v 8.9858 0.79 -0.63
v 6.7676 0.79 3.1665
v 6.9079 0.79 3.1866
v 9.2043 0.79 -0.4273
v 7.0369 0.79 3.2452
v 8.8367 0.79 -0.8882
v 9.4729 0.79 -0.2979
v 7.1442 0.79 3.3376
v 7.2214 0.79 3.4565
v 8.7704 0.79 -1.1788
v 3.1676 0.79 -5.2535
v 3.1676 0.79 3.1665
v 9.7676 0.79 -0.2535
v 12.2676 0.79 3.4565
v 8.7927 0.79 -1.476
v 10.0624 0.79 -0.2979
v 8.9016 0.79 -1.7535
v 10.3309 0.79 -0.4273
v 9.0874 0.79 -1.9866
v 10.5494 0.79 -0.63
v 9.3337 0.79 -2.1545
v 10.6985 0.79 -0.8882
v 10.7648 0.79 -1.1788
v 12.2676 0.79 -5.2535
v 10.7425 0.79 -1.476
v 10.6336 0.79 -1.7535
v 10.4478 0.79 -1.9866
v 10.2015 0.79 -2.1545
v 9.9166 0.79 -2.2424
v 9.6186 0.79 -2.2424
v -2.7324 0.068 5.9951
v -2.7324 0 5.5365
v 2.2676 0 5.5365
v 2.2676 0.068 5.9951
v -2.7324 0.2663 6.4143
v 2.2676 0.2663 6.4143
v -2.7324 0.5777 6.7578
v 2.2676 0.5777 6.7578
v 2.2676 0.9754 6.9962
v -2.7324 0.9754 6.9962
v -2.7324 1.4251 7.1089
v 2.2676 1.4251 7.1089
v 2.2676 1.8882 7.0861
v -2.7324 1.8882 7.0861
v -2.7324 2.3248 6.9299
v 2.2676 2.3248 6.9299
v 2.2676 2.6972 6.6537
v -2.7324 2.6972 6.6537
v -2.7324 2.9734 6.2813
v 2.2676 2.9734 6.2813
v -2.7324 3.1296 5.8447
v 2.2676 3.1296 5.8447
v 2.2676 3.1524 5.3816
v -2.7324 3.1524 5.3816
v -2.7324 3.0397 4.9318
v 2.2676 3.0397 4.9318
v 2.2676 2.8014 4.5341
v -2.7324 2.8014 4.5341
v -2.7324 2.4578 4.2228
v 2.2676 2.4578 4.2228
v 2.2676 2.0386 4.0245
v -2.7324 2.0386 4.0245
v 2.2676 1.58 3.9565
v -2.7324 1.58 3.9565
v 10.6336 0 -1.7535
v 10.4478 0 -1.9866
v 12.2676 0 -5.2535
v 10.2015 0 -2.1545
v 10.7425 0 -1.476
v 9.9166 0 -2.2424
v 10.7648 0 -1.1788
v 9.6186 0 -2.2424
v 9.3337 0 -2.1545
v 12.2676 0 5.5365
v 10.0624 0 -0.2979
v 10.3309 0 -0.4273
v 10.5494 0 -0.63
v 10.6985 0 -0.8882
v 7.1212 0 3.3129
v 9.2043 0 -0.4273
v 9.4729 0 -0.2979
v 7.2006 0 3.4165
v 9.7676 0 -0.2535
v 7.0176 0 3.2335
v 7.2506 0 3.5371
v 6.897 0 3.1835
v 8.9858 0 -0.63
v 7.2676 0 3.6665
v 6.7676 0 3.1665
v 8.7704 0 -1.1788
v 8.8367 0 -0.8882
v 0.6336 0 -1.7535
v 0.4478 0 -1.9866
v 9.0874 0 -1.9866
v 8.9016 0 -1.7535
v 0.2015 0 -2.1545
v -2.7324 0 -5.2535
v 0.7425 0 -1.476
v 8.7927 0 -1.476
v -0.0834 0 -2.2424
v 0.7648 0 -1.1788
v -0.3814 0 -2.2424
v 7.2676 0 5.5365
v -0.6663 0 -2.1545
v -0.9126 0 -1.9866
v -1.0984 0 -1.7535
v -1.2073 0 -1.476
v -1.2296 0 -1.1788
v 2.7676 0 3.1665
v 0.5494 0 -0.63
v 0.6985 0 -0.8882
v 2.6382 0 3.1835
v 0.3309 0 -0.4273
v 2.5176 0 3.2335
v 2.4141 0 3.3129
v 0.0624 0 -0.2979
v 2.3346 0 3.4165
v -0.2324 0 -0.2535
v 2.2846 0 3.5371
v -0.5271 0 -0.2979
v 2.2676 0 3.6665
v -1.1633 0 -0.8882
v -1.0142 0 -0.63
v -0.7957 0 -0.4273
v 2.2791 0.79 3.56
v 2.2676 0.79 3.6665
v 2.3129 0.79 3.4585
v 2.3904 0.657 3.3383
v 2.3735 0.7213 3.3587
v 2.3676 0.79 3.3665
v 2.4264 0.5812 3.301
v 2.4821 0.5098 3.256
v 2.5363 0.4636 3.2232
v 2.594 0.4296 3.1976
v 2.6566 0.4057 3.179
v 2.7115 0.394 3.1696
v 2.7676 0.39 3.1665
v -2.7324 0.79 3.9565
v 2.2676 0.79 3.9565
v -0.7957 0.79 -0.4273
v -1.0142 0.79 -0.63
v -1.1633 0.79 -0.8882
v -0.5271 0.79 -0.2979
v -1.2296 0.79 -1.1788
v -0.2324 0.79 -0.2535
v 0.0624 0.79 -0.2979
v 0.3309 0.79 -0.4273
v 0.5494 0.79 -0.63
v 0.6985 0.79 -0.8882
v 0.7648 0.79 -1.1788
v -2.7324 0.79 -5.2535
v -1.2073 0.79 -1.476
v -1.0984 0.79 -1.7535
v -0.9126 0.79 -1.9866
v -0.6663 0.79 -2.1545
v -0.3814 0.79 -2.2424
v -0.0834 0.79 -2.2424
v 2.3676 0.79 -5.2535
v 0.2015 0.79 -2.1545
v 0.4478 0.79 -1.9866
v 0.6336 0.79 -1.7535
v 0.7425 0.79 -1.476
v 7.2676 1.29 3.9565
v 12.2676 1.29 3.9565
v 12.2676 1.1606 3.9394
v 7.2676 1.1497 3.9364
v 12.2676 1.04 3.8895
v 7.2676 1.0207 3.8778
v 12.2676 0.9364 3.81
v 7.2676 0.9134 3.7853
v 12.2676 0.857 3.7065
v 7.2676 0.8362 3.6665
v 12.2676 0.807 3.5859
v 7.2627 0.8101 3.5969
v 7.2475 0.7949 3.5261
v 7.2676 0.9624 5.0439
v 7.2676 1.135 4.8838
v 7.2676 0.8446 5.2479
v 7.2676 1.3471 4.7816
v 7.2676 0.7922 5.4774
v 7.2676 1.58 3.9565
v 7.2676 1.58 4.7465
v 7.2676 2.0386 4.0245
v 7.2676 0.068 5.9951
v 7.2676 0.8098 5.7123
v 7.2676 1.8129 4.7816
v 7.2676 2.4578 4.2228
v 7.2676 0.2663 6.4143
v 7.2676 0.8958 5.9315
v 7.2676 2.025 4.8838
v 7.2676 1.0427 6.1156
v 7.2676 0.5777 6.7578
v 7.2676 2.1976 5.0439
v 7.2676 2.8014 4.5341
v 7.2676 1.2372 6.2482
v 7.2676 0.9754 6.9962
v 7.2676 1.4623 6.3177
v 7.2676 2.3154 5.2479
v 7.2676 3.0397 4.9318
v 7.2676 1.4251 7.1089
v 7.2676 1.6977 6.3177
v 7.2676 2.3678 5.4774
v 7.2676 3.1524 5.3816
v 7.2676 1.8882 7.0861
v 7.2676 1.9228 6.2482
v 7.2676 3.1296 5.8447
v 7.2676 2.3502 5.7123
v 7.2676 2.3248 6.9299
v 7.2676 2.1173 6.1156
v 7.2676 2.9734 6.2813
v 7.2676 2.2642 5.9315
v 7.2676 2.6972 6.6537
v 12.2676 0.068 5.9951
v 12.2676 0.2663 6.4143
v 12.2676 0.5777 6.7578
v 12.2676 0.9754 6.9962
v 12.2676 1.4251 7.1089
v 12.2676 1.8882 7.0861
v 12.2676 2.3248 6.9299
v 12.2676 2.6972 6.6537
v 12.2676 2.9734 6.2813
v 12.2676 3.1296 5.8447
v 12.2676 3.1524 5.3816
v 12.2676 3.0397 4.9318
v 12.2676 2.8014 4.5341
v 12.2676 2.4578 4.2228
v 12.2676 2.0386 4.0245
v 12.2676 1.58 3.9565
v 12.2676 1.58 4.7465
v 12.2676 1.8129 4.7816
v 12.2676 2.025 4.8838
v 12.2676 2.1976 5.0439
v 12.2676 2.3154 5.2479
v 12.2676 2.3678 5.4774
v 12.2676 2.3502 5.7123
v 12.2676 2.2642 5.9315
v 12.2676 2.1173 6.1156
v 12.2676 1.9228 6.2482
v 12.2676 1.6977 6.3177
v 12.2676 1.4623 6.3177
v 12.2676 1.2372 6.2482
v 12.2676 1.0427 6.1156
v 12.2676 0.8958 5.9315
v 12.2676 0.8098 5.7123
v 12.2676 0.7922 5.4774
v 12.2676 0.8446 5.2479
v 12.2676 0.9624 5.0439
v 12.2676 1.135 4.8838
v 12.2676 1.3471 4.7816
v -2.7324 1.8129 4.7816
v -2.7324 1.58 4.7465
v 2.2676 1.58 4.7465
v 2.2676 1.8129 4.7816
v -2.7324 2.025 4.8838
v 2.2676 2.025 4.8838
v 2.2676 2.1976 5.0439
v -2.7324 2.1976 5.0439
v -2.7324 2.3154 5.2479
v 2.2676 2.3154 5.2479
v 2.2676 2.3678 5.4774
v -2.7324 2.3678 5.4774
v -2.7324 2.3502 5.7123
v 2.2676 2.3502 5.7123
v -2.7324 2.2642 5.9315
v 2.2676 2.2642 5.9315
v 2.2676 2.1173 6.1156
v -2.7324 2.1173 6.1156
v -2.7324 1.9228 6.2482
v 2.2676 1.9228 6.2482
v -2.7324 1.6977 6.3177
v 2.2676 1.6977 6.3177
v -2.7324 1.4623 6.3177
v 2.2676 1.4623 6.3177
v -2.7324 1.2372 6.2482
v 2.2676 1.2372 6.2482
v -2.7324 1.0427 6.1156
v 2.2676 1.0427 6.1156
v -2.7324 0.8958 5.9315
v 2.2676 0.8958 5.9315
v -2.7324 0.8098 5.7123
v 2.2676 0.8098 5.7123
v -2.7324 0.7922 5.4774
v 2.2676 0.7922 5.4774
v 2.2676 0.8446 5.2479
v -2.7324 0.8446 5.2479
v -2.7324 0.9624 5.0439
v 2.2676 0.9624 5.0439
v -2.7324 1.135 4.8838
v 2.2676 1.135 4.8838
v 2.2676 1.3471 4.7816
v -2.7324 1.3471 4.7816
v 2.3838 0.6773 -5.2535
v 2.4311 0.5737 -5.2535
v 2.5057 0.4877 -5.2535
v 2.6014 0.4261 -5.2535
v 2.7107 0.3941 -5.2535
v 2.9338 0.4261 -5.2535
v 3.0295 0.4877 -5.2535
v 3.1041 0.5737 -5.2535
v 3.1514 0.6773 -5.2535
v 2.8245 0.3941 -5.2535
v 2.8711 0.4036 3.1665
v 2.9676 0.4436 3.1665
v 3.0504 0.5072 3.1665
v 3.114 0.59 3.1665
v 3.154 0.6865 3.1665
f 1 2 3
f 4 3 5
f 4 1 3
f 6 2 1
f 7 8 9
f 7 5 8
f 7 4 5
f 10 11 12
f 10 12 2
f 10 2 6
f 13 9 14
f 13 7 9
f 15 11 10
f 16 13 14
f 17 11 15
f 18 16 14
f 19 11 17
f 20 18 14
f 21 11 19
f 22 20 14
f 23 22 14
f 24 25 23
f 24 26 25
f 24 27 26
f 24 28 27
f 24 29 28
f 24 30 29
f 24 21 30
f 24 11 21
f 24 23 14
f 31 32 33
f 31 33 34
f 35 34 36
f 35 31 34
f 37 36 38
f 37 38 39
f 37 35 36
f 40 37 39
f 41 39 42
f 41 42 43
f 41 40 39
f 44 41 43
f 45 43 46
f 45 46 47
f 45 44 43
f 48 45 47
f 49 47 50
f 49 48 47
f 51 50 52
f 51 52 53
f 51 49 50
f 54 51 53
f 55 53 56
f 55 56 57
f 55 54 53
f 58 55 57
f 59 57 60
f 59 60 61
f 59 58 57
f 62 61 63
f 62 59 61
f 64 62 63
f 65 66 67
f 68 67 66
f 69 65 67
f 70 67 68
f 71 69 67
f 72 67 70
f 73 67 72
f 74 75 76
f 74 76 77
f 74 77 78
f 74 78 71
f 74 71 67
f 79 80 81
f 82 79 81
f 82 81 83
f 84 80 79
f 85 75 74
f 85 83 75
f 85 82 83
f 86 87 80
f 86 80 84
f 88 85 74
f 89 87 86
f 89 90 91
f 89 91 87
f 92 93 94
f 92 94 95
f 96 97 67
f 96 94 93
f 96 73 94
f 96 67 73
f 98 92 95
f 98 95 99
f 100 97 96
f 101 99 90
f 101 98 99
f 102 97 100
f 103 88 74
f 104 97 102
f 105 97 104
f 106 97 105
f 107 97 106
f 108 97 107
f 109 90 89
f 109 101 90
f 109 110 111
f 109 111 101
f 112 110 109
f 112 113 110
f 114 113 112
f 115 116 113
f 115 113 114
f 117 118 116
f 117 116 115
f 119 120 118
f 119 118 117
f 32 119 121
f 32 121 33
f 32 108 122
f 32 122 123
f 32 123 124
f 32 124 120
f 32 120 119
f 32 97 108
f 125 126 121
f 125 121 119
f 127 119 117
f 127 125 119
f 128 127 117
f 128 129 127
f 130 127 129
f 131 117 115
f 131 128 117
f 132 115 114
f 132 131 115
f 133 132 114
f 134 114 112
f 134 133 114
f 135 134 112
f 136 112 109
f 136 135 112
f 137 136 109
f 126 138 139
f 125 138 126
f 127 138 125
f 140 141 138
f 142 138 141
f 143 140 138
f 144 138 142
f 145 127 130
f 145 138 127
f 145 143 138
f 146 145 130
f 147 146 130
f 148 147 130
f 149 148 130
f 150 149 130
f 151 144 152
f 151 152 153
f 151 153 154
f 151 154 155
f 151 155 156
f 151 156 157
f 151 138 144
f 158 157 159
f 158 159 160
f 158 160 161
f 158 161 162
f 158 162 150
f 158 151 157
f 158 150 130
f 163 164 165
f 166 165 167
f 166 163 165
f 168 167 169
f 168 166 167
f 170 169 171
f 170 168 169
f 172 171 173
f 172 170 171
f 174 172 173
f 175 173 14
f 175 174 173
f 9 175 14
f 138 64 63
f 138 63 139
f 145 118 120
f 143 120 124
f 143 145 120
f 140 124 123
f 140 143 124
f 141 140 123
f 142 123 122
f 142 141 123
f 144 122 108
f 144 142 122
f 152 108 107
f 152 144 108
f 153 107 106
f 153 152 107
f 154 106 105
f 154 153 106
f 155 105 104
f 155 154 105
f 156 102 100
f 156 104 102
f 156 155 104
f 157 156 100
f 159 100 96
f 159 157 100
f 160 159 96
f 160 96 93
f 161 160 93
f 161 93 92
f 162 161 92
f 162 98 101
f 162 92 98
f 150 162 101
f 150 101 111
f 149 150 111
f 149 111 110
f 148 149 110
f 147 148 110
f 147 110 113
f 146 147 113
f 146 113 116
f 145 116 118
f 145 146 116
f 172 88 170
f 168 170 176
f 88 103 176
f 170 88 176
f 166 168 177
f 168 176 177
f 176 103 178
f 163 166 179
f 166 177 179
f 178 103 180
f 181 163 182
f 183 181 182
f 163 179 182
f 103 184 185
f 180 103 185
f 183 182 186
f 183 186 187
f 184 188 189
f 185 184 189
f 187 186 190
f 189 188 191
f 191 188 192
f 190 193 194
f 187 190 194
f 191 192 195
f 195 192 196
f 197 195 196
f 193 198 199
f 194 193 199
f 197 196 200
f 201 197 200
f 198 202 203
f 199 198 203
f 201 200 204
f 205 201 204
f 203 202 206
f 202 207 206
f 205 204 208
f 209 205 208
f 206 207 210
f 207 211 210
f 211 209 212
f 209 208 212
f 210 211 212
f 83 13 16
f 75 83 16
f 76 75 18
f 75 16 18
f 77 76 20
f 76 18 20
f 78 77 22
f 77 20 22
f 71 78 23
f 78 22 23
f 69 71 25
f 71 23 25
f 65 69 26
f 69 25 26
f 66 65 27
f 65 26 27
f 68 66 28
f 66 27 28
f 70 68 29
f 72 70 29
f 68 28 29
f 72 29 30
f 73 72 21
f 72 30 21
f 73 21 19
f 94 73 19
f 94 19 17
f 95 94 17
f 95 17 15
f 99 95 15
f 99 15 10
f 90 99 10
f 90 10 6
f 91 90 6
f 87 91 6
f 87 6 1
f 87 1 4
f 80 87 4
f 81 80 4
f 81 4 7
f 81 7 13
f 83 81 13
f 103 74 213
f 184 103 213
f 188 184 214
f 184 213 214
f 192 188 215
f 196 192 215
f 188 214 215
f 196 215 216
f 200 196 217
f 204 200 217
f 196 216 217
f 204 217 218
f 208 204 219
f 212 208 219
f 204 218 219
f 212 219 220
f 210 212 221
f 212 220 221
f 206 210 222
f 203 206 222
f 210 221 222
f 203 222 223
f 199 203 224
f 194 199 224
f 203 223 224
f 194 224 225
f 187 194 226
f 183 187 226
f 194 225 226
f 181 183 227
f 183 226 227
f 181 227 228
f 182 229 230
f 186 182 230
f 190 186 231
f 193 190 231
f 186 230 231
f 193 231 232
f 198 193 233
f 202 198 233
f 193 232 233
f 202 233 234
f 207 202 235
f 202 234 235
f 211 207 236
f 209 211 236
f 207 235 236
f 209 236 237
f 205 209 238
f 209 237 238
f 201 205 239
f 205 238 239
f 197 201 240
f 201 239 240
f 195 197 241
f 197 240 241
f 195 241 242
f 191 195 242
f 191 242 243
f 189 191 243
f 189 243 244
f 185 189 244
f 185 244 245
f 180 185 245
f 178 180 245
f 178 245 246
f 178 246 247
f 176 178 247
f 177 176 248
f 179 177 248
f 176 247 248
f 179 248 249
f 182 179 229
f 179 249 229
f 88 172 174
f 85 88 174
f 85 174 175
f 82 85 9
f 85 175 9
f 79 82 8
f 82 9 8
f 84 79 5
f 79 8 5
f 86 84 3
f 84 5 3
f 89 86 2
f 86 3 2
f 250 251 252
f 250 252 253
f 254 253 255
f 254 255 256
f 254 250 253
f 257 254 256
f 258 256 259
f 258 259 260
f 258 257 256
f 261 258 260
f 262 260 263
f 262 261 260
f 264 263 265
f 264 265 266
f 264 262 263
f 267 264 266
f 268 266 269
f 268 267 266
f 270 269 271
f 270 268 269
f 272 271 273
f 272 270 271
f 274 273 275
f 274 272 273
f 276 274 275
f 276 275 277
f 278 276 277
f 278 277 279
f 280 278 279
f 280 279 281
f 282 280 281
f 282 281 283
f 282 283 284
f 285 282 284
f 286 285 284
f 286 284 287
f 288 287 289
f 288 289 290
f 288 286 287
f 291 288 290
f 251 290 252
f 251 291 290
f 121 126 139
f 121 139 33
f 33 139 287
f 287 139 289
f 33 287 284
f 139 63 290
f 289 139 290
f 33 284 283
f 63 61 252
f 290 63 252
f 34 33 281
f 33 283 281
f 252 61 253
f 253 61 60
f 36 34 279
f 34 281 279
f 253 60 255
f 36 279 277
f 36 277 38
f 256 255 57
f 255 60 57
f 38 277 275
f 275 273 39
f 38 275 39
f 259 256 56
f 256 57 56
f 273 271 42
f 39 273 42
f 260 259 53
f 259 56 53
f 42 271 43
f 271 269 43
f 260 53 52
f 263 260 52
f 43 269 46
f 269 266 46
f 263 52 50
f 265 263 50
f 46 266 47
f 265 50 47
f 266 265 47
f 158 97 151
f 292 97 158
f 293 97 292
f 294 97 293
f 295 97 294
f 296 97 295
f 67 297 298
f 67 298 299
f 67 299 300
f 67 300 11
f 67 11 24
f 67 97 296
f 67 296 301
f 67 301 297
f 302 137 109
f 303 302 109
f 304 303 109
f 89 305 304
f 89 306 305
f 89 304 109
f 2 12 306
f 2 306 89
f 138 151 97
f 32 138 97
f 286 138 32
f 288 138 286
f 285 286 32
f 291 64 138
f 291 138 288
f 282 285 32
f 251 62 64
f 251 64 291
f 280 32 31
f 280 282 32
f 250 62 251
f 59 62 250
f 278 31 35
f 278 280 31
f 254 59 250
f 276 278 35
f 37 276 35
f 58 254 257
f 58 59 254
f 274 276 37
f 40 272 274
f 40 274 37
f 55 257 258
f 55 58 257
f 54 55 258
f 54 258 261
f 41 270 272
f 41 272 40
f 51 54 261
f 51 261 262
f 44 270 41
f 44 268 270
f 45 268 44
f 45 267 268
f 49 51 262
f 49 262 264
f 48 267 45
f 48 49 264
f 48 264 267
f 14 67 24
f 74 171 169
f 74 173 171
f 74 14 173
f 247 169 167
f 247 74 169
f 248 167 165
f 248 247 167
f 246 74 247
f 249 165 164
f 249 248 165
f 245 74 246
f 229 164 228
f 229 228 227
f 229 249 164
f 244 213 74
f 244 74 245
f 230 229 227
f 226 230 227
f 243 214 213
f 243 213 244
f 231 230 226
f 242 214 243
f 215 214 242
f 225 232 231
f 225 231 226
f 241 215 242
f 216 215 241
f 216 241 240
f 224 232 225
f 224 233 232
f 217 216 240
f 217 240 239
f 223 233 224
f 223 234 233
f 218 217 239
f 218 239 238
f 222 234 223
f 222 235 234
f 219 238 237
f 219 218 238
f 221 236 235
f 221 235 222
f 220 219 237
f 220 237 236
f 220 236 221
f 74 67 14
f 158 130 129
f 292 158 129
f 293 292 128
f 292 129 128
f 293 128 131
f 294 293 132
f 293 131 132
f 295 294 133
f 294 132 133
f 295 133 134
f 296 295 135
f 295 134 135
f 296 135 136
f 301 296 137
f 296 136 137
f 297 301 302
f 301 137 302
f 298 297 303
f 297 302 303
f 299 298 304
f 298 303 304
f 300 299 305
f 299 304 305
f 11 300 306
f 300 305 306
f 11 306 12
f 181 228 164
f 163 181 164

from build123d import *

# Parameters (mm, degrees)
SKETCH1_W              = 25
SKETCH1_H              = 10
BASE_PLATE_DEPTH       = 0.79
SKETCH5_R              = 0.79
PIN_HOLDER_DEPTH       = 5
FILLET1_R              = 0.5
SKETCH6_R              = 1
SCREW_HOLES_DEPTH      = 5
SKETCH7_W              = 5
SKETCH7_H              = 0.79
HINGE_GROOVES_DEPTH    = 1.58
FILLET2_R              = 0.5
SKETCH8_R              = 0.4
SKETCH10_W             = 8.42
SKETCH10_H             = 0.79
EXTERNAL_CUTOFF_DEPTH  = 5
SKETCH11_W             = 8.42
SKETCH11_H             = 0.79
EXTERNAL_CUTOFF2_DEPTH = 5


with BuildPart() as part:
    # Sketch1 → Base Plate (new body)
    with BuildSketch(Plane(origin=(0, 0, 0), x_dir=(1, 0, 0), z_dir=(0, 1, 0))):
        with Locations((4.767605634, 0.253521127)):
            Rectangle(SKETCH1_W, SKETCH1_H)
    extrude(amount=BASE_PLATE_DEPTH)

    # Sketch5 → Pin Holder (add)
    with BuildSketch(Plane(origin=(12.267605634, 0, 0), x_dir=(0, 0, -1), z_dir=(1, 0, 0))):
        with BuildLine():
            Line((-3.956478873, 1.58), (-3.956478873, 0.79))
            ThreePointArc((-3.956478873, 0.79), (-4.187864516, 0.231385643), (-4.746478873, 0))
            Line((-4.746478873, 0), (-5.536478873, 0))
            ThreePointArc((-5.536478873, 0), (-6.653707588, 2.697228714), (-3.956478873, 1.58))
        make_face()
        with Locations((-5.536478873, 1.58)):
            Circle(SKETCH5_R, mode=Mode.SUBTRACT)
    pin_holder = extrude(amount=-PIN_HOLDER_DEPTH)

    # Fillet1
    fillet1_edges = [part.edges().sort_by_distance(p)[0] for p in [
        (9.767605634, 0.79, 3.956478873),
    ]]
    fillet(fillet1_edges, radius=FILLET1_R)

    # Sketch6 → Screw Holes (cut)
    with BuildSketch(Plane(origin=(0, 0.79, 0), x_dir=(1, 0, 0), z_dir=(0, 1, 0))):
        with Locations(Location((9.767605634, 1.253521127, 0), (0, 0, 270))):
            Circle(SKETCH6_R)
    screw_holes = extrude(amount=-SCREW_HOLES_DEPTH, mode=Mode.SUBTRACT)

    # Mirror1: Pin Holder, Screw Holes across plane
    add(pin_holder.mirror(Plane(origin=(4.767605634, 0, 0), x_dir=(0, 0, 1), z_dir=(1, 0, 0))))
    add(screw_holes.mirror(Plane(origin=(4.767605634, 0, 0), x_dir=(0, 0, 1), z_dir=(1, 0, 0))), mode=Mode.SUBTRACT)

    # Sketch7 → Hinge Grooves (cut)
    with BuildSketch(Plane.XY.offset(4.746478873)):
        with Locations((14.767605634, 0.395)):
            Rectangle(SKETCH7_W, SKETCH7_H)
        with Locations((4.767605634, 0.395)):
            Rectangle(SKETCH7_W, SKETCH7_H)
        with Locations((-5.232394366, 0.395)):
            Rectangle(SKETCH7_W, SKETCH7_H)
    extrude(amount=-HINGE_GROOVES_DEPTH, mode=Mode.SUBTRACT)

    # Fillet2
    fillet2_edges = [part.edges().sort_by_distance(p)[0] for p in [
        (7.267605634, 0.395, 3.166478873),
        (2.267605634, 0.395, 3.166478873),
    ]]
    fillet(fillet2_edges, radius=FILLET2_R)

    # Wire Groove: sweep along a path in Sketch9
    with BuildLine(Plane.XZ) as wire_groove_path:
        Line((2.767605634, -5.253521127), (2.767605634, 3.166478873))
        Line((2.767605634, 3.166478873), (2.767605634, 3.884059602))
    # Sketch8 → Wire Groove (sweep, cut)
    with BuildSketch(Plane(origin=(0, 0, -5.253521127), x_dir=(-1, 0, 0), z_dir=(0, 0, -1))):
        with Locations((-2.767605634, 0.79)):
            Circle(SKETCH8_R)
    sweep(path=wire_groove_path.line, mode=Mode.SUBTRACT)

    # Sketch10 → External Cutoff (cut)
    with BuildSketch(Plane.ZY.offset(7.732394366)):
        with Locations((-1.043521127, 0.395)):
            Rectangle(SKETCH10_W, SKETCH10_H)
    extrude(amount=-EXTERNAL_CUTOFF_DEPTH, mode=Mode.SUBTRACT)

    # Sketch11 → External Cutoff2 (cut)
    with BuildSketch(Plane(origin=(17.267605634, 0, 0), x_dir=(0, 0, -1), z_dir=(1, 0, 0))):
        with Locations((1.043521127, 0.395)):
            Rectangle(SKETCH11_W, SKETCH11_H)
    extrude(amount=-EXTERNAL_CUTOFF2_DEPTH, mode=Mode.SUBTRACT)


solid = part.part
